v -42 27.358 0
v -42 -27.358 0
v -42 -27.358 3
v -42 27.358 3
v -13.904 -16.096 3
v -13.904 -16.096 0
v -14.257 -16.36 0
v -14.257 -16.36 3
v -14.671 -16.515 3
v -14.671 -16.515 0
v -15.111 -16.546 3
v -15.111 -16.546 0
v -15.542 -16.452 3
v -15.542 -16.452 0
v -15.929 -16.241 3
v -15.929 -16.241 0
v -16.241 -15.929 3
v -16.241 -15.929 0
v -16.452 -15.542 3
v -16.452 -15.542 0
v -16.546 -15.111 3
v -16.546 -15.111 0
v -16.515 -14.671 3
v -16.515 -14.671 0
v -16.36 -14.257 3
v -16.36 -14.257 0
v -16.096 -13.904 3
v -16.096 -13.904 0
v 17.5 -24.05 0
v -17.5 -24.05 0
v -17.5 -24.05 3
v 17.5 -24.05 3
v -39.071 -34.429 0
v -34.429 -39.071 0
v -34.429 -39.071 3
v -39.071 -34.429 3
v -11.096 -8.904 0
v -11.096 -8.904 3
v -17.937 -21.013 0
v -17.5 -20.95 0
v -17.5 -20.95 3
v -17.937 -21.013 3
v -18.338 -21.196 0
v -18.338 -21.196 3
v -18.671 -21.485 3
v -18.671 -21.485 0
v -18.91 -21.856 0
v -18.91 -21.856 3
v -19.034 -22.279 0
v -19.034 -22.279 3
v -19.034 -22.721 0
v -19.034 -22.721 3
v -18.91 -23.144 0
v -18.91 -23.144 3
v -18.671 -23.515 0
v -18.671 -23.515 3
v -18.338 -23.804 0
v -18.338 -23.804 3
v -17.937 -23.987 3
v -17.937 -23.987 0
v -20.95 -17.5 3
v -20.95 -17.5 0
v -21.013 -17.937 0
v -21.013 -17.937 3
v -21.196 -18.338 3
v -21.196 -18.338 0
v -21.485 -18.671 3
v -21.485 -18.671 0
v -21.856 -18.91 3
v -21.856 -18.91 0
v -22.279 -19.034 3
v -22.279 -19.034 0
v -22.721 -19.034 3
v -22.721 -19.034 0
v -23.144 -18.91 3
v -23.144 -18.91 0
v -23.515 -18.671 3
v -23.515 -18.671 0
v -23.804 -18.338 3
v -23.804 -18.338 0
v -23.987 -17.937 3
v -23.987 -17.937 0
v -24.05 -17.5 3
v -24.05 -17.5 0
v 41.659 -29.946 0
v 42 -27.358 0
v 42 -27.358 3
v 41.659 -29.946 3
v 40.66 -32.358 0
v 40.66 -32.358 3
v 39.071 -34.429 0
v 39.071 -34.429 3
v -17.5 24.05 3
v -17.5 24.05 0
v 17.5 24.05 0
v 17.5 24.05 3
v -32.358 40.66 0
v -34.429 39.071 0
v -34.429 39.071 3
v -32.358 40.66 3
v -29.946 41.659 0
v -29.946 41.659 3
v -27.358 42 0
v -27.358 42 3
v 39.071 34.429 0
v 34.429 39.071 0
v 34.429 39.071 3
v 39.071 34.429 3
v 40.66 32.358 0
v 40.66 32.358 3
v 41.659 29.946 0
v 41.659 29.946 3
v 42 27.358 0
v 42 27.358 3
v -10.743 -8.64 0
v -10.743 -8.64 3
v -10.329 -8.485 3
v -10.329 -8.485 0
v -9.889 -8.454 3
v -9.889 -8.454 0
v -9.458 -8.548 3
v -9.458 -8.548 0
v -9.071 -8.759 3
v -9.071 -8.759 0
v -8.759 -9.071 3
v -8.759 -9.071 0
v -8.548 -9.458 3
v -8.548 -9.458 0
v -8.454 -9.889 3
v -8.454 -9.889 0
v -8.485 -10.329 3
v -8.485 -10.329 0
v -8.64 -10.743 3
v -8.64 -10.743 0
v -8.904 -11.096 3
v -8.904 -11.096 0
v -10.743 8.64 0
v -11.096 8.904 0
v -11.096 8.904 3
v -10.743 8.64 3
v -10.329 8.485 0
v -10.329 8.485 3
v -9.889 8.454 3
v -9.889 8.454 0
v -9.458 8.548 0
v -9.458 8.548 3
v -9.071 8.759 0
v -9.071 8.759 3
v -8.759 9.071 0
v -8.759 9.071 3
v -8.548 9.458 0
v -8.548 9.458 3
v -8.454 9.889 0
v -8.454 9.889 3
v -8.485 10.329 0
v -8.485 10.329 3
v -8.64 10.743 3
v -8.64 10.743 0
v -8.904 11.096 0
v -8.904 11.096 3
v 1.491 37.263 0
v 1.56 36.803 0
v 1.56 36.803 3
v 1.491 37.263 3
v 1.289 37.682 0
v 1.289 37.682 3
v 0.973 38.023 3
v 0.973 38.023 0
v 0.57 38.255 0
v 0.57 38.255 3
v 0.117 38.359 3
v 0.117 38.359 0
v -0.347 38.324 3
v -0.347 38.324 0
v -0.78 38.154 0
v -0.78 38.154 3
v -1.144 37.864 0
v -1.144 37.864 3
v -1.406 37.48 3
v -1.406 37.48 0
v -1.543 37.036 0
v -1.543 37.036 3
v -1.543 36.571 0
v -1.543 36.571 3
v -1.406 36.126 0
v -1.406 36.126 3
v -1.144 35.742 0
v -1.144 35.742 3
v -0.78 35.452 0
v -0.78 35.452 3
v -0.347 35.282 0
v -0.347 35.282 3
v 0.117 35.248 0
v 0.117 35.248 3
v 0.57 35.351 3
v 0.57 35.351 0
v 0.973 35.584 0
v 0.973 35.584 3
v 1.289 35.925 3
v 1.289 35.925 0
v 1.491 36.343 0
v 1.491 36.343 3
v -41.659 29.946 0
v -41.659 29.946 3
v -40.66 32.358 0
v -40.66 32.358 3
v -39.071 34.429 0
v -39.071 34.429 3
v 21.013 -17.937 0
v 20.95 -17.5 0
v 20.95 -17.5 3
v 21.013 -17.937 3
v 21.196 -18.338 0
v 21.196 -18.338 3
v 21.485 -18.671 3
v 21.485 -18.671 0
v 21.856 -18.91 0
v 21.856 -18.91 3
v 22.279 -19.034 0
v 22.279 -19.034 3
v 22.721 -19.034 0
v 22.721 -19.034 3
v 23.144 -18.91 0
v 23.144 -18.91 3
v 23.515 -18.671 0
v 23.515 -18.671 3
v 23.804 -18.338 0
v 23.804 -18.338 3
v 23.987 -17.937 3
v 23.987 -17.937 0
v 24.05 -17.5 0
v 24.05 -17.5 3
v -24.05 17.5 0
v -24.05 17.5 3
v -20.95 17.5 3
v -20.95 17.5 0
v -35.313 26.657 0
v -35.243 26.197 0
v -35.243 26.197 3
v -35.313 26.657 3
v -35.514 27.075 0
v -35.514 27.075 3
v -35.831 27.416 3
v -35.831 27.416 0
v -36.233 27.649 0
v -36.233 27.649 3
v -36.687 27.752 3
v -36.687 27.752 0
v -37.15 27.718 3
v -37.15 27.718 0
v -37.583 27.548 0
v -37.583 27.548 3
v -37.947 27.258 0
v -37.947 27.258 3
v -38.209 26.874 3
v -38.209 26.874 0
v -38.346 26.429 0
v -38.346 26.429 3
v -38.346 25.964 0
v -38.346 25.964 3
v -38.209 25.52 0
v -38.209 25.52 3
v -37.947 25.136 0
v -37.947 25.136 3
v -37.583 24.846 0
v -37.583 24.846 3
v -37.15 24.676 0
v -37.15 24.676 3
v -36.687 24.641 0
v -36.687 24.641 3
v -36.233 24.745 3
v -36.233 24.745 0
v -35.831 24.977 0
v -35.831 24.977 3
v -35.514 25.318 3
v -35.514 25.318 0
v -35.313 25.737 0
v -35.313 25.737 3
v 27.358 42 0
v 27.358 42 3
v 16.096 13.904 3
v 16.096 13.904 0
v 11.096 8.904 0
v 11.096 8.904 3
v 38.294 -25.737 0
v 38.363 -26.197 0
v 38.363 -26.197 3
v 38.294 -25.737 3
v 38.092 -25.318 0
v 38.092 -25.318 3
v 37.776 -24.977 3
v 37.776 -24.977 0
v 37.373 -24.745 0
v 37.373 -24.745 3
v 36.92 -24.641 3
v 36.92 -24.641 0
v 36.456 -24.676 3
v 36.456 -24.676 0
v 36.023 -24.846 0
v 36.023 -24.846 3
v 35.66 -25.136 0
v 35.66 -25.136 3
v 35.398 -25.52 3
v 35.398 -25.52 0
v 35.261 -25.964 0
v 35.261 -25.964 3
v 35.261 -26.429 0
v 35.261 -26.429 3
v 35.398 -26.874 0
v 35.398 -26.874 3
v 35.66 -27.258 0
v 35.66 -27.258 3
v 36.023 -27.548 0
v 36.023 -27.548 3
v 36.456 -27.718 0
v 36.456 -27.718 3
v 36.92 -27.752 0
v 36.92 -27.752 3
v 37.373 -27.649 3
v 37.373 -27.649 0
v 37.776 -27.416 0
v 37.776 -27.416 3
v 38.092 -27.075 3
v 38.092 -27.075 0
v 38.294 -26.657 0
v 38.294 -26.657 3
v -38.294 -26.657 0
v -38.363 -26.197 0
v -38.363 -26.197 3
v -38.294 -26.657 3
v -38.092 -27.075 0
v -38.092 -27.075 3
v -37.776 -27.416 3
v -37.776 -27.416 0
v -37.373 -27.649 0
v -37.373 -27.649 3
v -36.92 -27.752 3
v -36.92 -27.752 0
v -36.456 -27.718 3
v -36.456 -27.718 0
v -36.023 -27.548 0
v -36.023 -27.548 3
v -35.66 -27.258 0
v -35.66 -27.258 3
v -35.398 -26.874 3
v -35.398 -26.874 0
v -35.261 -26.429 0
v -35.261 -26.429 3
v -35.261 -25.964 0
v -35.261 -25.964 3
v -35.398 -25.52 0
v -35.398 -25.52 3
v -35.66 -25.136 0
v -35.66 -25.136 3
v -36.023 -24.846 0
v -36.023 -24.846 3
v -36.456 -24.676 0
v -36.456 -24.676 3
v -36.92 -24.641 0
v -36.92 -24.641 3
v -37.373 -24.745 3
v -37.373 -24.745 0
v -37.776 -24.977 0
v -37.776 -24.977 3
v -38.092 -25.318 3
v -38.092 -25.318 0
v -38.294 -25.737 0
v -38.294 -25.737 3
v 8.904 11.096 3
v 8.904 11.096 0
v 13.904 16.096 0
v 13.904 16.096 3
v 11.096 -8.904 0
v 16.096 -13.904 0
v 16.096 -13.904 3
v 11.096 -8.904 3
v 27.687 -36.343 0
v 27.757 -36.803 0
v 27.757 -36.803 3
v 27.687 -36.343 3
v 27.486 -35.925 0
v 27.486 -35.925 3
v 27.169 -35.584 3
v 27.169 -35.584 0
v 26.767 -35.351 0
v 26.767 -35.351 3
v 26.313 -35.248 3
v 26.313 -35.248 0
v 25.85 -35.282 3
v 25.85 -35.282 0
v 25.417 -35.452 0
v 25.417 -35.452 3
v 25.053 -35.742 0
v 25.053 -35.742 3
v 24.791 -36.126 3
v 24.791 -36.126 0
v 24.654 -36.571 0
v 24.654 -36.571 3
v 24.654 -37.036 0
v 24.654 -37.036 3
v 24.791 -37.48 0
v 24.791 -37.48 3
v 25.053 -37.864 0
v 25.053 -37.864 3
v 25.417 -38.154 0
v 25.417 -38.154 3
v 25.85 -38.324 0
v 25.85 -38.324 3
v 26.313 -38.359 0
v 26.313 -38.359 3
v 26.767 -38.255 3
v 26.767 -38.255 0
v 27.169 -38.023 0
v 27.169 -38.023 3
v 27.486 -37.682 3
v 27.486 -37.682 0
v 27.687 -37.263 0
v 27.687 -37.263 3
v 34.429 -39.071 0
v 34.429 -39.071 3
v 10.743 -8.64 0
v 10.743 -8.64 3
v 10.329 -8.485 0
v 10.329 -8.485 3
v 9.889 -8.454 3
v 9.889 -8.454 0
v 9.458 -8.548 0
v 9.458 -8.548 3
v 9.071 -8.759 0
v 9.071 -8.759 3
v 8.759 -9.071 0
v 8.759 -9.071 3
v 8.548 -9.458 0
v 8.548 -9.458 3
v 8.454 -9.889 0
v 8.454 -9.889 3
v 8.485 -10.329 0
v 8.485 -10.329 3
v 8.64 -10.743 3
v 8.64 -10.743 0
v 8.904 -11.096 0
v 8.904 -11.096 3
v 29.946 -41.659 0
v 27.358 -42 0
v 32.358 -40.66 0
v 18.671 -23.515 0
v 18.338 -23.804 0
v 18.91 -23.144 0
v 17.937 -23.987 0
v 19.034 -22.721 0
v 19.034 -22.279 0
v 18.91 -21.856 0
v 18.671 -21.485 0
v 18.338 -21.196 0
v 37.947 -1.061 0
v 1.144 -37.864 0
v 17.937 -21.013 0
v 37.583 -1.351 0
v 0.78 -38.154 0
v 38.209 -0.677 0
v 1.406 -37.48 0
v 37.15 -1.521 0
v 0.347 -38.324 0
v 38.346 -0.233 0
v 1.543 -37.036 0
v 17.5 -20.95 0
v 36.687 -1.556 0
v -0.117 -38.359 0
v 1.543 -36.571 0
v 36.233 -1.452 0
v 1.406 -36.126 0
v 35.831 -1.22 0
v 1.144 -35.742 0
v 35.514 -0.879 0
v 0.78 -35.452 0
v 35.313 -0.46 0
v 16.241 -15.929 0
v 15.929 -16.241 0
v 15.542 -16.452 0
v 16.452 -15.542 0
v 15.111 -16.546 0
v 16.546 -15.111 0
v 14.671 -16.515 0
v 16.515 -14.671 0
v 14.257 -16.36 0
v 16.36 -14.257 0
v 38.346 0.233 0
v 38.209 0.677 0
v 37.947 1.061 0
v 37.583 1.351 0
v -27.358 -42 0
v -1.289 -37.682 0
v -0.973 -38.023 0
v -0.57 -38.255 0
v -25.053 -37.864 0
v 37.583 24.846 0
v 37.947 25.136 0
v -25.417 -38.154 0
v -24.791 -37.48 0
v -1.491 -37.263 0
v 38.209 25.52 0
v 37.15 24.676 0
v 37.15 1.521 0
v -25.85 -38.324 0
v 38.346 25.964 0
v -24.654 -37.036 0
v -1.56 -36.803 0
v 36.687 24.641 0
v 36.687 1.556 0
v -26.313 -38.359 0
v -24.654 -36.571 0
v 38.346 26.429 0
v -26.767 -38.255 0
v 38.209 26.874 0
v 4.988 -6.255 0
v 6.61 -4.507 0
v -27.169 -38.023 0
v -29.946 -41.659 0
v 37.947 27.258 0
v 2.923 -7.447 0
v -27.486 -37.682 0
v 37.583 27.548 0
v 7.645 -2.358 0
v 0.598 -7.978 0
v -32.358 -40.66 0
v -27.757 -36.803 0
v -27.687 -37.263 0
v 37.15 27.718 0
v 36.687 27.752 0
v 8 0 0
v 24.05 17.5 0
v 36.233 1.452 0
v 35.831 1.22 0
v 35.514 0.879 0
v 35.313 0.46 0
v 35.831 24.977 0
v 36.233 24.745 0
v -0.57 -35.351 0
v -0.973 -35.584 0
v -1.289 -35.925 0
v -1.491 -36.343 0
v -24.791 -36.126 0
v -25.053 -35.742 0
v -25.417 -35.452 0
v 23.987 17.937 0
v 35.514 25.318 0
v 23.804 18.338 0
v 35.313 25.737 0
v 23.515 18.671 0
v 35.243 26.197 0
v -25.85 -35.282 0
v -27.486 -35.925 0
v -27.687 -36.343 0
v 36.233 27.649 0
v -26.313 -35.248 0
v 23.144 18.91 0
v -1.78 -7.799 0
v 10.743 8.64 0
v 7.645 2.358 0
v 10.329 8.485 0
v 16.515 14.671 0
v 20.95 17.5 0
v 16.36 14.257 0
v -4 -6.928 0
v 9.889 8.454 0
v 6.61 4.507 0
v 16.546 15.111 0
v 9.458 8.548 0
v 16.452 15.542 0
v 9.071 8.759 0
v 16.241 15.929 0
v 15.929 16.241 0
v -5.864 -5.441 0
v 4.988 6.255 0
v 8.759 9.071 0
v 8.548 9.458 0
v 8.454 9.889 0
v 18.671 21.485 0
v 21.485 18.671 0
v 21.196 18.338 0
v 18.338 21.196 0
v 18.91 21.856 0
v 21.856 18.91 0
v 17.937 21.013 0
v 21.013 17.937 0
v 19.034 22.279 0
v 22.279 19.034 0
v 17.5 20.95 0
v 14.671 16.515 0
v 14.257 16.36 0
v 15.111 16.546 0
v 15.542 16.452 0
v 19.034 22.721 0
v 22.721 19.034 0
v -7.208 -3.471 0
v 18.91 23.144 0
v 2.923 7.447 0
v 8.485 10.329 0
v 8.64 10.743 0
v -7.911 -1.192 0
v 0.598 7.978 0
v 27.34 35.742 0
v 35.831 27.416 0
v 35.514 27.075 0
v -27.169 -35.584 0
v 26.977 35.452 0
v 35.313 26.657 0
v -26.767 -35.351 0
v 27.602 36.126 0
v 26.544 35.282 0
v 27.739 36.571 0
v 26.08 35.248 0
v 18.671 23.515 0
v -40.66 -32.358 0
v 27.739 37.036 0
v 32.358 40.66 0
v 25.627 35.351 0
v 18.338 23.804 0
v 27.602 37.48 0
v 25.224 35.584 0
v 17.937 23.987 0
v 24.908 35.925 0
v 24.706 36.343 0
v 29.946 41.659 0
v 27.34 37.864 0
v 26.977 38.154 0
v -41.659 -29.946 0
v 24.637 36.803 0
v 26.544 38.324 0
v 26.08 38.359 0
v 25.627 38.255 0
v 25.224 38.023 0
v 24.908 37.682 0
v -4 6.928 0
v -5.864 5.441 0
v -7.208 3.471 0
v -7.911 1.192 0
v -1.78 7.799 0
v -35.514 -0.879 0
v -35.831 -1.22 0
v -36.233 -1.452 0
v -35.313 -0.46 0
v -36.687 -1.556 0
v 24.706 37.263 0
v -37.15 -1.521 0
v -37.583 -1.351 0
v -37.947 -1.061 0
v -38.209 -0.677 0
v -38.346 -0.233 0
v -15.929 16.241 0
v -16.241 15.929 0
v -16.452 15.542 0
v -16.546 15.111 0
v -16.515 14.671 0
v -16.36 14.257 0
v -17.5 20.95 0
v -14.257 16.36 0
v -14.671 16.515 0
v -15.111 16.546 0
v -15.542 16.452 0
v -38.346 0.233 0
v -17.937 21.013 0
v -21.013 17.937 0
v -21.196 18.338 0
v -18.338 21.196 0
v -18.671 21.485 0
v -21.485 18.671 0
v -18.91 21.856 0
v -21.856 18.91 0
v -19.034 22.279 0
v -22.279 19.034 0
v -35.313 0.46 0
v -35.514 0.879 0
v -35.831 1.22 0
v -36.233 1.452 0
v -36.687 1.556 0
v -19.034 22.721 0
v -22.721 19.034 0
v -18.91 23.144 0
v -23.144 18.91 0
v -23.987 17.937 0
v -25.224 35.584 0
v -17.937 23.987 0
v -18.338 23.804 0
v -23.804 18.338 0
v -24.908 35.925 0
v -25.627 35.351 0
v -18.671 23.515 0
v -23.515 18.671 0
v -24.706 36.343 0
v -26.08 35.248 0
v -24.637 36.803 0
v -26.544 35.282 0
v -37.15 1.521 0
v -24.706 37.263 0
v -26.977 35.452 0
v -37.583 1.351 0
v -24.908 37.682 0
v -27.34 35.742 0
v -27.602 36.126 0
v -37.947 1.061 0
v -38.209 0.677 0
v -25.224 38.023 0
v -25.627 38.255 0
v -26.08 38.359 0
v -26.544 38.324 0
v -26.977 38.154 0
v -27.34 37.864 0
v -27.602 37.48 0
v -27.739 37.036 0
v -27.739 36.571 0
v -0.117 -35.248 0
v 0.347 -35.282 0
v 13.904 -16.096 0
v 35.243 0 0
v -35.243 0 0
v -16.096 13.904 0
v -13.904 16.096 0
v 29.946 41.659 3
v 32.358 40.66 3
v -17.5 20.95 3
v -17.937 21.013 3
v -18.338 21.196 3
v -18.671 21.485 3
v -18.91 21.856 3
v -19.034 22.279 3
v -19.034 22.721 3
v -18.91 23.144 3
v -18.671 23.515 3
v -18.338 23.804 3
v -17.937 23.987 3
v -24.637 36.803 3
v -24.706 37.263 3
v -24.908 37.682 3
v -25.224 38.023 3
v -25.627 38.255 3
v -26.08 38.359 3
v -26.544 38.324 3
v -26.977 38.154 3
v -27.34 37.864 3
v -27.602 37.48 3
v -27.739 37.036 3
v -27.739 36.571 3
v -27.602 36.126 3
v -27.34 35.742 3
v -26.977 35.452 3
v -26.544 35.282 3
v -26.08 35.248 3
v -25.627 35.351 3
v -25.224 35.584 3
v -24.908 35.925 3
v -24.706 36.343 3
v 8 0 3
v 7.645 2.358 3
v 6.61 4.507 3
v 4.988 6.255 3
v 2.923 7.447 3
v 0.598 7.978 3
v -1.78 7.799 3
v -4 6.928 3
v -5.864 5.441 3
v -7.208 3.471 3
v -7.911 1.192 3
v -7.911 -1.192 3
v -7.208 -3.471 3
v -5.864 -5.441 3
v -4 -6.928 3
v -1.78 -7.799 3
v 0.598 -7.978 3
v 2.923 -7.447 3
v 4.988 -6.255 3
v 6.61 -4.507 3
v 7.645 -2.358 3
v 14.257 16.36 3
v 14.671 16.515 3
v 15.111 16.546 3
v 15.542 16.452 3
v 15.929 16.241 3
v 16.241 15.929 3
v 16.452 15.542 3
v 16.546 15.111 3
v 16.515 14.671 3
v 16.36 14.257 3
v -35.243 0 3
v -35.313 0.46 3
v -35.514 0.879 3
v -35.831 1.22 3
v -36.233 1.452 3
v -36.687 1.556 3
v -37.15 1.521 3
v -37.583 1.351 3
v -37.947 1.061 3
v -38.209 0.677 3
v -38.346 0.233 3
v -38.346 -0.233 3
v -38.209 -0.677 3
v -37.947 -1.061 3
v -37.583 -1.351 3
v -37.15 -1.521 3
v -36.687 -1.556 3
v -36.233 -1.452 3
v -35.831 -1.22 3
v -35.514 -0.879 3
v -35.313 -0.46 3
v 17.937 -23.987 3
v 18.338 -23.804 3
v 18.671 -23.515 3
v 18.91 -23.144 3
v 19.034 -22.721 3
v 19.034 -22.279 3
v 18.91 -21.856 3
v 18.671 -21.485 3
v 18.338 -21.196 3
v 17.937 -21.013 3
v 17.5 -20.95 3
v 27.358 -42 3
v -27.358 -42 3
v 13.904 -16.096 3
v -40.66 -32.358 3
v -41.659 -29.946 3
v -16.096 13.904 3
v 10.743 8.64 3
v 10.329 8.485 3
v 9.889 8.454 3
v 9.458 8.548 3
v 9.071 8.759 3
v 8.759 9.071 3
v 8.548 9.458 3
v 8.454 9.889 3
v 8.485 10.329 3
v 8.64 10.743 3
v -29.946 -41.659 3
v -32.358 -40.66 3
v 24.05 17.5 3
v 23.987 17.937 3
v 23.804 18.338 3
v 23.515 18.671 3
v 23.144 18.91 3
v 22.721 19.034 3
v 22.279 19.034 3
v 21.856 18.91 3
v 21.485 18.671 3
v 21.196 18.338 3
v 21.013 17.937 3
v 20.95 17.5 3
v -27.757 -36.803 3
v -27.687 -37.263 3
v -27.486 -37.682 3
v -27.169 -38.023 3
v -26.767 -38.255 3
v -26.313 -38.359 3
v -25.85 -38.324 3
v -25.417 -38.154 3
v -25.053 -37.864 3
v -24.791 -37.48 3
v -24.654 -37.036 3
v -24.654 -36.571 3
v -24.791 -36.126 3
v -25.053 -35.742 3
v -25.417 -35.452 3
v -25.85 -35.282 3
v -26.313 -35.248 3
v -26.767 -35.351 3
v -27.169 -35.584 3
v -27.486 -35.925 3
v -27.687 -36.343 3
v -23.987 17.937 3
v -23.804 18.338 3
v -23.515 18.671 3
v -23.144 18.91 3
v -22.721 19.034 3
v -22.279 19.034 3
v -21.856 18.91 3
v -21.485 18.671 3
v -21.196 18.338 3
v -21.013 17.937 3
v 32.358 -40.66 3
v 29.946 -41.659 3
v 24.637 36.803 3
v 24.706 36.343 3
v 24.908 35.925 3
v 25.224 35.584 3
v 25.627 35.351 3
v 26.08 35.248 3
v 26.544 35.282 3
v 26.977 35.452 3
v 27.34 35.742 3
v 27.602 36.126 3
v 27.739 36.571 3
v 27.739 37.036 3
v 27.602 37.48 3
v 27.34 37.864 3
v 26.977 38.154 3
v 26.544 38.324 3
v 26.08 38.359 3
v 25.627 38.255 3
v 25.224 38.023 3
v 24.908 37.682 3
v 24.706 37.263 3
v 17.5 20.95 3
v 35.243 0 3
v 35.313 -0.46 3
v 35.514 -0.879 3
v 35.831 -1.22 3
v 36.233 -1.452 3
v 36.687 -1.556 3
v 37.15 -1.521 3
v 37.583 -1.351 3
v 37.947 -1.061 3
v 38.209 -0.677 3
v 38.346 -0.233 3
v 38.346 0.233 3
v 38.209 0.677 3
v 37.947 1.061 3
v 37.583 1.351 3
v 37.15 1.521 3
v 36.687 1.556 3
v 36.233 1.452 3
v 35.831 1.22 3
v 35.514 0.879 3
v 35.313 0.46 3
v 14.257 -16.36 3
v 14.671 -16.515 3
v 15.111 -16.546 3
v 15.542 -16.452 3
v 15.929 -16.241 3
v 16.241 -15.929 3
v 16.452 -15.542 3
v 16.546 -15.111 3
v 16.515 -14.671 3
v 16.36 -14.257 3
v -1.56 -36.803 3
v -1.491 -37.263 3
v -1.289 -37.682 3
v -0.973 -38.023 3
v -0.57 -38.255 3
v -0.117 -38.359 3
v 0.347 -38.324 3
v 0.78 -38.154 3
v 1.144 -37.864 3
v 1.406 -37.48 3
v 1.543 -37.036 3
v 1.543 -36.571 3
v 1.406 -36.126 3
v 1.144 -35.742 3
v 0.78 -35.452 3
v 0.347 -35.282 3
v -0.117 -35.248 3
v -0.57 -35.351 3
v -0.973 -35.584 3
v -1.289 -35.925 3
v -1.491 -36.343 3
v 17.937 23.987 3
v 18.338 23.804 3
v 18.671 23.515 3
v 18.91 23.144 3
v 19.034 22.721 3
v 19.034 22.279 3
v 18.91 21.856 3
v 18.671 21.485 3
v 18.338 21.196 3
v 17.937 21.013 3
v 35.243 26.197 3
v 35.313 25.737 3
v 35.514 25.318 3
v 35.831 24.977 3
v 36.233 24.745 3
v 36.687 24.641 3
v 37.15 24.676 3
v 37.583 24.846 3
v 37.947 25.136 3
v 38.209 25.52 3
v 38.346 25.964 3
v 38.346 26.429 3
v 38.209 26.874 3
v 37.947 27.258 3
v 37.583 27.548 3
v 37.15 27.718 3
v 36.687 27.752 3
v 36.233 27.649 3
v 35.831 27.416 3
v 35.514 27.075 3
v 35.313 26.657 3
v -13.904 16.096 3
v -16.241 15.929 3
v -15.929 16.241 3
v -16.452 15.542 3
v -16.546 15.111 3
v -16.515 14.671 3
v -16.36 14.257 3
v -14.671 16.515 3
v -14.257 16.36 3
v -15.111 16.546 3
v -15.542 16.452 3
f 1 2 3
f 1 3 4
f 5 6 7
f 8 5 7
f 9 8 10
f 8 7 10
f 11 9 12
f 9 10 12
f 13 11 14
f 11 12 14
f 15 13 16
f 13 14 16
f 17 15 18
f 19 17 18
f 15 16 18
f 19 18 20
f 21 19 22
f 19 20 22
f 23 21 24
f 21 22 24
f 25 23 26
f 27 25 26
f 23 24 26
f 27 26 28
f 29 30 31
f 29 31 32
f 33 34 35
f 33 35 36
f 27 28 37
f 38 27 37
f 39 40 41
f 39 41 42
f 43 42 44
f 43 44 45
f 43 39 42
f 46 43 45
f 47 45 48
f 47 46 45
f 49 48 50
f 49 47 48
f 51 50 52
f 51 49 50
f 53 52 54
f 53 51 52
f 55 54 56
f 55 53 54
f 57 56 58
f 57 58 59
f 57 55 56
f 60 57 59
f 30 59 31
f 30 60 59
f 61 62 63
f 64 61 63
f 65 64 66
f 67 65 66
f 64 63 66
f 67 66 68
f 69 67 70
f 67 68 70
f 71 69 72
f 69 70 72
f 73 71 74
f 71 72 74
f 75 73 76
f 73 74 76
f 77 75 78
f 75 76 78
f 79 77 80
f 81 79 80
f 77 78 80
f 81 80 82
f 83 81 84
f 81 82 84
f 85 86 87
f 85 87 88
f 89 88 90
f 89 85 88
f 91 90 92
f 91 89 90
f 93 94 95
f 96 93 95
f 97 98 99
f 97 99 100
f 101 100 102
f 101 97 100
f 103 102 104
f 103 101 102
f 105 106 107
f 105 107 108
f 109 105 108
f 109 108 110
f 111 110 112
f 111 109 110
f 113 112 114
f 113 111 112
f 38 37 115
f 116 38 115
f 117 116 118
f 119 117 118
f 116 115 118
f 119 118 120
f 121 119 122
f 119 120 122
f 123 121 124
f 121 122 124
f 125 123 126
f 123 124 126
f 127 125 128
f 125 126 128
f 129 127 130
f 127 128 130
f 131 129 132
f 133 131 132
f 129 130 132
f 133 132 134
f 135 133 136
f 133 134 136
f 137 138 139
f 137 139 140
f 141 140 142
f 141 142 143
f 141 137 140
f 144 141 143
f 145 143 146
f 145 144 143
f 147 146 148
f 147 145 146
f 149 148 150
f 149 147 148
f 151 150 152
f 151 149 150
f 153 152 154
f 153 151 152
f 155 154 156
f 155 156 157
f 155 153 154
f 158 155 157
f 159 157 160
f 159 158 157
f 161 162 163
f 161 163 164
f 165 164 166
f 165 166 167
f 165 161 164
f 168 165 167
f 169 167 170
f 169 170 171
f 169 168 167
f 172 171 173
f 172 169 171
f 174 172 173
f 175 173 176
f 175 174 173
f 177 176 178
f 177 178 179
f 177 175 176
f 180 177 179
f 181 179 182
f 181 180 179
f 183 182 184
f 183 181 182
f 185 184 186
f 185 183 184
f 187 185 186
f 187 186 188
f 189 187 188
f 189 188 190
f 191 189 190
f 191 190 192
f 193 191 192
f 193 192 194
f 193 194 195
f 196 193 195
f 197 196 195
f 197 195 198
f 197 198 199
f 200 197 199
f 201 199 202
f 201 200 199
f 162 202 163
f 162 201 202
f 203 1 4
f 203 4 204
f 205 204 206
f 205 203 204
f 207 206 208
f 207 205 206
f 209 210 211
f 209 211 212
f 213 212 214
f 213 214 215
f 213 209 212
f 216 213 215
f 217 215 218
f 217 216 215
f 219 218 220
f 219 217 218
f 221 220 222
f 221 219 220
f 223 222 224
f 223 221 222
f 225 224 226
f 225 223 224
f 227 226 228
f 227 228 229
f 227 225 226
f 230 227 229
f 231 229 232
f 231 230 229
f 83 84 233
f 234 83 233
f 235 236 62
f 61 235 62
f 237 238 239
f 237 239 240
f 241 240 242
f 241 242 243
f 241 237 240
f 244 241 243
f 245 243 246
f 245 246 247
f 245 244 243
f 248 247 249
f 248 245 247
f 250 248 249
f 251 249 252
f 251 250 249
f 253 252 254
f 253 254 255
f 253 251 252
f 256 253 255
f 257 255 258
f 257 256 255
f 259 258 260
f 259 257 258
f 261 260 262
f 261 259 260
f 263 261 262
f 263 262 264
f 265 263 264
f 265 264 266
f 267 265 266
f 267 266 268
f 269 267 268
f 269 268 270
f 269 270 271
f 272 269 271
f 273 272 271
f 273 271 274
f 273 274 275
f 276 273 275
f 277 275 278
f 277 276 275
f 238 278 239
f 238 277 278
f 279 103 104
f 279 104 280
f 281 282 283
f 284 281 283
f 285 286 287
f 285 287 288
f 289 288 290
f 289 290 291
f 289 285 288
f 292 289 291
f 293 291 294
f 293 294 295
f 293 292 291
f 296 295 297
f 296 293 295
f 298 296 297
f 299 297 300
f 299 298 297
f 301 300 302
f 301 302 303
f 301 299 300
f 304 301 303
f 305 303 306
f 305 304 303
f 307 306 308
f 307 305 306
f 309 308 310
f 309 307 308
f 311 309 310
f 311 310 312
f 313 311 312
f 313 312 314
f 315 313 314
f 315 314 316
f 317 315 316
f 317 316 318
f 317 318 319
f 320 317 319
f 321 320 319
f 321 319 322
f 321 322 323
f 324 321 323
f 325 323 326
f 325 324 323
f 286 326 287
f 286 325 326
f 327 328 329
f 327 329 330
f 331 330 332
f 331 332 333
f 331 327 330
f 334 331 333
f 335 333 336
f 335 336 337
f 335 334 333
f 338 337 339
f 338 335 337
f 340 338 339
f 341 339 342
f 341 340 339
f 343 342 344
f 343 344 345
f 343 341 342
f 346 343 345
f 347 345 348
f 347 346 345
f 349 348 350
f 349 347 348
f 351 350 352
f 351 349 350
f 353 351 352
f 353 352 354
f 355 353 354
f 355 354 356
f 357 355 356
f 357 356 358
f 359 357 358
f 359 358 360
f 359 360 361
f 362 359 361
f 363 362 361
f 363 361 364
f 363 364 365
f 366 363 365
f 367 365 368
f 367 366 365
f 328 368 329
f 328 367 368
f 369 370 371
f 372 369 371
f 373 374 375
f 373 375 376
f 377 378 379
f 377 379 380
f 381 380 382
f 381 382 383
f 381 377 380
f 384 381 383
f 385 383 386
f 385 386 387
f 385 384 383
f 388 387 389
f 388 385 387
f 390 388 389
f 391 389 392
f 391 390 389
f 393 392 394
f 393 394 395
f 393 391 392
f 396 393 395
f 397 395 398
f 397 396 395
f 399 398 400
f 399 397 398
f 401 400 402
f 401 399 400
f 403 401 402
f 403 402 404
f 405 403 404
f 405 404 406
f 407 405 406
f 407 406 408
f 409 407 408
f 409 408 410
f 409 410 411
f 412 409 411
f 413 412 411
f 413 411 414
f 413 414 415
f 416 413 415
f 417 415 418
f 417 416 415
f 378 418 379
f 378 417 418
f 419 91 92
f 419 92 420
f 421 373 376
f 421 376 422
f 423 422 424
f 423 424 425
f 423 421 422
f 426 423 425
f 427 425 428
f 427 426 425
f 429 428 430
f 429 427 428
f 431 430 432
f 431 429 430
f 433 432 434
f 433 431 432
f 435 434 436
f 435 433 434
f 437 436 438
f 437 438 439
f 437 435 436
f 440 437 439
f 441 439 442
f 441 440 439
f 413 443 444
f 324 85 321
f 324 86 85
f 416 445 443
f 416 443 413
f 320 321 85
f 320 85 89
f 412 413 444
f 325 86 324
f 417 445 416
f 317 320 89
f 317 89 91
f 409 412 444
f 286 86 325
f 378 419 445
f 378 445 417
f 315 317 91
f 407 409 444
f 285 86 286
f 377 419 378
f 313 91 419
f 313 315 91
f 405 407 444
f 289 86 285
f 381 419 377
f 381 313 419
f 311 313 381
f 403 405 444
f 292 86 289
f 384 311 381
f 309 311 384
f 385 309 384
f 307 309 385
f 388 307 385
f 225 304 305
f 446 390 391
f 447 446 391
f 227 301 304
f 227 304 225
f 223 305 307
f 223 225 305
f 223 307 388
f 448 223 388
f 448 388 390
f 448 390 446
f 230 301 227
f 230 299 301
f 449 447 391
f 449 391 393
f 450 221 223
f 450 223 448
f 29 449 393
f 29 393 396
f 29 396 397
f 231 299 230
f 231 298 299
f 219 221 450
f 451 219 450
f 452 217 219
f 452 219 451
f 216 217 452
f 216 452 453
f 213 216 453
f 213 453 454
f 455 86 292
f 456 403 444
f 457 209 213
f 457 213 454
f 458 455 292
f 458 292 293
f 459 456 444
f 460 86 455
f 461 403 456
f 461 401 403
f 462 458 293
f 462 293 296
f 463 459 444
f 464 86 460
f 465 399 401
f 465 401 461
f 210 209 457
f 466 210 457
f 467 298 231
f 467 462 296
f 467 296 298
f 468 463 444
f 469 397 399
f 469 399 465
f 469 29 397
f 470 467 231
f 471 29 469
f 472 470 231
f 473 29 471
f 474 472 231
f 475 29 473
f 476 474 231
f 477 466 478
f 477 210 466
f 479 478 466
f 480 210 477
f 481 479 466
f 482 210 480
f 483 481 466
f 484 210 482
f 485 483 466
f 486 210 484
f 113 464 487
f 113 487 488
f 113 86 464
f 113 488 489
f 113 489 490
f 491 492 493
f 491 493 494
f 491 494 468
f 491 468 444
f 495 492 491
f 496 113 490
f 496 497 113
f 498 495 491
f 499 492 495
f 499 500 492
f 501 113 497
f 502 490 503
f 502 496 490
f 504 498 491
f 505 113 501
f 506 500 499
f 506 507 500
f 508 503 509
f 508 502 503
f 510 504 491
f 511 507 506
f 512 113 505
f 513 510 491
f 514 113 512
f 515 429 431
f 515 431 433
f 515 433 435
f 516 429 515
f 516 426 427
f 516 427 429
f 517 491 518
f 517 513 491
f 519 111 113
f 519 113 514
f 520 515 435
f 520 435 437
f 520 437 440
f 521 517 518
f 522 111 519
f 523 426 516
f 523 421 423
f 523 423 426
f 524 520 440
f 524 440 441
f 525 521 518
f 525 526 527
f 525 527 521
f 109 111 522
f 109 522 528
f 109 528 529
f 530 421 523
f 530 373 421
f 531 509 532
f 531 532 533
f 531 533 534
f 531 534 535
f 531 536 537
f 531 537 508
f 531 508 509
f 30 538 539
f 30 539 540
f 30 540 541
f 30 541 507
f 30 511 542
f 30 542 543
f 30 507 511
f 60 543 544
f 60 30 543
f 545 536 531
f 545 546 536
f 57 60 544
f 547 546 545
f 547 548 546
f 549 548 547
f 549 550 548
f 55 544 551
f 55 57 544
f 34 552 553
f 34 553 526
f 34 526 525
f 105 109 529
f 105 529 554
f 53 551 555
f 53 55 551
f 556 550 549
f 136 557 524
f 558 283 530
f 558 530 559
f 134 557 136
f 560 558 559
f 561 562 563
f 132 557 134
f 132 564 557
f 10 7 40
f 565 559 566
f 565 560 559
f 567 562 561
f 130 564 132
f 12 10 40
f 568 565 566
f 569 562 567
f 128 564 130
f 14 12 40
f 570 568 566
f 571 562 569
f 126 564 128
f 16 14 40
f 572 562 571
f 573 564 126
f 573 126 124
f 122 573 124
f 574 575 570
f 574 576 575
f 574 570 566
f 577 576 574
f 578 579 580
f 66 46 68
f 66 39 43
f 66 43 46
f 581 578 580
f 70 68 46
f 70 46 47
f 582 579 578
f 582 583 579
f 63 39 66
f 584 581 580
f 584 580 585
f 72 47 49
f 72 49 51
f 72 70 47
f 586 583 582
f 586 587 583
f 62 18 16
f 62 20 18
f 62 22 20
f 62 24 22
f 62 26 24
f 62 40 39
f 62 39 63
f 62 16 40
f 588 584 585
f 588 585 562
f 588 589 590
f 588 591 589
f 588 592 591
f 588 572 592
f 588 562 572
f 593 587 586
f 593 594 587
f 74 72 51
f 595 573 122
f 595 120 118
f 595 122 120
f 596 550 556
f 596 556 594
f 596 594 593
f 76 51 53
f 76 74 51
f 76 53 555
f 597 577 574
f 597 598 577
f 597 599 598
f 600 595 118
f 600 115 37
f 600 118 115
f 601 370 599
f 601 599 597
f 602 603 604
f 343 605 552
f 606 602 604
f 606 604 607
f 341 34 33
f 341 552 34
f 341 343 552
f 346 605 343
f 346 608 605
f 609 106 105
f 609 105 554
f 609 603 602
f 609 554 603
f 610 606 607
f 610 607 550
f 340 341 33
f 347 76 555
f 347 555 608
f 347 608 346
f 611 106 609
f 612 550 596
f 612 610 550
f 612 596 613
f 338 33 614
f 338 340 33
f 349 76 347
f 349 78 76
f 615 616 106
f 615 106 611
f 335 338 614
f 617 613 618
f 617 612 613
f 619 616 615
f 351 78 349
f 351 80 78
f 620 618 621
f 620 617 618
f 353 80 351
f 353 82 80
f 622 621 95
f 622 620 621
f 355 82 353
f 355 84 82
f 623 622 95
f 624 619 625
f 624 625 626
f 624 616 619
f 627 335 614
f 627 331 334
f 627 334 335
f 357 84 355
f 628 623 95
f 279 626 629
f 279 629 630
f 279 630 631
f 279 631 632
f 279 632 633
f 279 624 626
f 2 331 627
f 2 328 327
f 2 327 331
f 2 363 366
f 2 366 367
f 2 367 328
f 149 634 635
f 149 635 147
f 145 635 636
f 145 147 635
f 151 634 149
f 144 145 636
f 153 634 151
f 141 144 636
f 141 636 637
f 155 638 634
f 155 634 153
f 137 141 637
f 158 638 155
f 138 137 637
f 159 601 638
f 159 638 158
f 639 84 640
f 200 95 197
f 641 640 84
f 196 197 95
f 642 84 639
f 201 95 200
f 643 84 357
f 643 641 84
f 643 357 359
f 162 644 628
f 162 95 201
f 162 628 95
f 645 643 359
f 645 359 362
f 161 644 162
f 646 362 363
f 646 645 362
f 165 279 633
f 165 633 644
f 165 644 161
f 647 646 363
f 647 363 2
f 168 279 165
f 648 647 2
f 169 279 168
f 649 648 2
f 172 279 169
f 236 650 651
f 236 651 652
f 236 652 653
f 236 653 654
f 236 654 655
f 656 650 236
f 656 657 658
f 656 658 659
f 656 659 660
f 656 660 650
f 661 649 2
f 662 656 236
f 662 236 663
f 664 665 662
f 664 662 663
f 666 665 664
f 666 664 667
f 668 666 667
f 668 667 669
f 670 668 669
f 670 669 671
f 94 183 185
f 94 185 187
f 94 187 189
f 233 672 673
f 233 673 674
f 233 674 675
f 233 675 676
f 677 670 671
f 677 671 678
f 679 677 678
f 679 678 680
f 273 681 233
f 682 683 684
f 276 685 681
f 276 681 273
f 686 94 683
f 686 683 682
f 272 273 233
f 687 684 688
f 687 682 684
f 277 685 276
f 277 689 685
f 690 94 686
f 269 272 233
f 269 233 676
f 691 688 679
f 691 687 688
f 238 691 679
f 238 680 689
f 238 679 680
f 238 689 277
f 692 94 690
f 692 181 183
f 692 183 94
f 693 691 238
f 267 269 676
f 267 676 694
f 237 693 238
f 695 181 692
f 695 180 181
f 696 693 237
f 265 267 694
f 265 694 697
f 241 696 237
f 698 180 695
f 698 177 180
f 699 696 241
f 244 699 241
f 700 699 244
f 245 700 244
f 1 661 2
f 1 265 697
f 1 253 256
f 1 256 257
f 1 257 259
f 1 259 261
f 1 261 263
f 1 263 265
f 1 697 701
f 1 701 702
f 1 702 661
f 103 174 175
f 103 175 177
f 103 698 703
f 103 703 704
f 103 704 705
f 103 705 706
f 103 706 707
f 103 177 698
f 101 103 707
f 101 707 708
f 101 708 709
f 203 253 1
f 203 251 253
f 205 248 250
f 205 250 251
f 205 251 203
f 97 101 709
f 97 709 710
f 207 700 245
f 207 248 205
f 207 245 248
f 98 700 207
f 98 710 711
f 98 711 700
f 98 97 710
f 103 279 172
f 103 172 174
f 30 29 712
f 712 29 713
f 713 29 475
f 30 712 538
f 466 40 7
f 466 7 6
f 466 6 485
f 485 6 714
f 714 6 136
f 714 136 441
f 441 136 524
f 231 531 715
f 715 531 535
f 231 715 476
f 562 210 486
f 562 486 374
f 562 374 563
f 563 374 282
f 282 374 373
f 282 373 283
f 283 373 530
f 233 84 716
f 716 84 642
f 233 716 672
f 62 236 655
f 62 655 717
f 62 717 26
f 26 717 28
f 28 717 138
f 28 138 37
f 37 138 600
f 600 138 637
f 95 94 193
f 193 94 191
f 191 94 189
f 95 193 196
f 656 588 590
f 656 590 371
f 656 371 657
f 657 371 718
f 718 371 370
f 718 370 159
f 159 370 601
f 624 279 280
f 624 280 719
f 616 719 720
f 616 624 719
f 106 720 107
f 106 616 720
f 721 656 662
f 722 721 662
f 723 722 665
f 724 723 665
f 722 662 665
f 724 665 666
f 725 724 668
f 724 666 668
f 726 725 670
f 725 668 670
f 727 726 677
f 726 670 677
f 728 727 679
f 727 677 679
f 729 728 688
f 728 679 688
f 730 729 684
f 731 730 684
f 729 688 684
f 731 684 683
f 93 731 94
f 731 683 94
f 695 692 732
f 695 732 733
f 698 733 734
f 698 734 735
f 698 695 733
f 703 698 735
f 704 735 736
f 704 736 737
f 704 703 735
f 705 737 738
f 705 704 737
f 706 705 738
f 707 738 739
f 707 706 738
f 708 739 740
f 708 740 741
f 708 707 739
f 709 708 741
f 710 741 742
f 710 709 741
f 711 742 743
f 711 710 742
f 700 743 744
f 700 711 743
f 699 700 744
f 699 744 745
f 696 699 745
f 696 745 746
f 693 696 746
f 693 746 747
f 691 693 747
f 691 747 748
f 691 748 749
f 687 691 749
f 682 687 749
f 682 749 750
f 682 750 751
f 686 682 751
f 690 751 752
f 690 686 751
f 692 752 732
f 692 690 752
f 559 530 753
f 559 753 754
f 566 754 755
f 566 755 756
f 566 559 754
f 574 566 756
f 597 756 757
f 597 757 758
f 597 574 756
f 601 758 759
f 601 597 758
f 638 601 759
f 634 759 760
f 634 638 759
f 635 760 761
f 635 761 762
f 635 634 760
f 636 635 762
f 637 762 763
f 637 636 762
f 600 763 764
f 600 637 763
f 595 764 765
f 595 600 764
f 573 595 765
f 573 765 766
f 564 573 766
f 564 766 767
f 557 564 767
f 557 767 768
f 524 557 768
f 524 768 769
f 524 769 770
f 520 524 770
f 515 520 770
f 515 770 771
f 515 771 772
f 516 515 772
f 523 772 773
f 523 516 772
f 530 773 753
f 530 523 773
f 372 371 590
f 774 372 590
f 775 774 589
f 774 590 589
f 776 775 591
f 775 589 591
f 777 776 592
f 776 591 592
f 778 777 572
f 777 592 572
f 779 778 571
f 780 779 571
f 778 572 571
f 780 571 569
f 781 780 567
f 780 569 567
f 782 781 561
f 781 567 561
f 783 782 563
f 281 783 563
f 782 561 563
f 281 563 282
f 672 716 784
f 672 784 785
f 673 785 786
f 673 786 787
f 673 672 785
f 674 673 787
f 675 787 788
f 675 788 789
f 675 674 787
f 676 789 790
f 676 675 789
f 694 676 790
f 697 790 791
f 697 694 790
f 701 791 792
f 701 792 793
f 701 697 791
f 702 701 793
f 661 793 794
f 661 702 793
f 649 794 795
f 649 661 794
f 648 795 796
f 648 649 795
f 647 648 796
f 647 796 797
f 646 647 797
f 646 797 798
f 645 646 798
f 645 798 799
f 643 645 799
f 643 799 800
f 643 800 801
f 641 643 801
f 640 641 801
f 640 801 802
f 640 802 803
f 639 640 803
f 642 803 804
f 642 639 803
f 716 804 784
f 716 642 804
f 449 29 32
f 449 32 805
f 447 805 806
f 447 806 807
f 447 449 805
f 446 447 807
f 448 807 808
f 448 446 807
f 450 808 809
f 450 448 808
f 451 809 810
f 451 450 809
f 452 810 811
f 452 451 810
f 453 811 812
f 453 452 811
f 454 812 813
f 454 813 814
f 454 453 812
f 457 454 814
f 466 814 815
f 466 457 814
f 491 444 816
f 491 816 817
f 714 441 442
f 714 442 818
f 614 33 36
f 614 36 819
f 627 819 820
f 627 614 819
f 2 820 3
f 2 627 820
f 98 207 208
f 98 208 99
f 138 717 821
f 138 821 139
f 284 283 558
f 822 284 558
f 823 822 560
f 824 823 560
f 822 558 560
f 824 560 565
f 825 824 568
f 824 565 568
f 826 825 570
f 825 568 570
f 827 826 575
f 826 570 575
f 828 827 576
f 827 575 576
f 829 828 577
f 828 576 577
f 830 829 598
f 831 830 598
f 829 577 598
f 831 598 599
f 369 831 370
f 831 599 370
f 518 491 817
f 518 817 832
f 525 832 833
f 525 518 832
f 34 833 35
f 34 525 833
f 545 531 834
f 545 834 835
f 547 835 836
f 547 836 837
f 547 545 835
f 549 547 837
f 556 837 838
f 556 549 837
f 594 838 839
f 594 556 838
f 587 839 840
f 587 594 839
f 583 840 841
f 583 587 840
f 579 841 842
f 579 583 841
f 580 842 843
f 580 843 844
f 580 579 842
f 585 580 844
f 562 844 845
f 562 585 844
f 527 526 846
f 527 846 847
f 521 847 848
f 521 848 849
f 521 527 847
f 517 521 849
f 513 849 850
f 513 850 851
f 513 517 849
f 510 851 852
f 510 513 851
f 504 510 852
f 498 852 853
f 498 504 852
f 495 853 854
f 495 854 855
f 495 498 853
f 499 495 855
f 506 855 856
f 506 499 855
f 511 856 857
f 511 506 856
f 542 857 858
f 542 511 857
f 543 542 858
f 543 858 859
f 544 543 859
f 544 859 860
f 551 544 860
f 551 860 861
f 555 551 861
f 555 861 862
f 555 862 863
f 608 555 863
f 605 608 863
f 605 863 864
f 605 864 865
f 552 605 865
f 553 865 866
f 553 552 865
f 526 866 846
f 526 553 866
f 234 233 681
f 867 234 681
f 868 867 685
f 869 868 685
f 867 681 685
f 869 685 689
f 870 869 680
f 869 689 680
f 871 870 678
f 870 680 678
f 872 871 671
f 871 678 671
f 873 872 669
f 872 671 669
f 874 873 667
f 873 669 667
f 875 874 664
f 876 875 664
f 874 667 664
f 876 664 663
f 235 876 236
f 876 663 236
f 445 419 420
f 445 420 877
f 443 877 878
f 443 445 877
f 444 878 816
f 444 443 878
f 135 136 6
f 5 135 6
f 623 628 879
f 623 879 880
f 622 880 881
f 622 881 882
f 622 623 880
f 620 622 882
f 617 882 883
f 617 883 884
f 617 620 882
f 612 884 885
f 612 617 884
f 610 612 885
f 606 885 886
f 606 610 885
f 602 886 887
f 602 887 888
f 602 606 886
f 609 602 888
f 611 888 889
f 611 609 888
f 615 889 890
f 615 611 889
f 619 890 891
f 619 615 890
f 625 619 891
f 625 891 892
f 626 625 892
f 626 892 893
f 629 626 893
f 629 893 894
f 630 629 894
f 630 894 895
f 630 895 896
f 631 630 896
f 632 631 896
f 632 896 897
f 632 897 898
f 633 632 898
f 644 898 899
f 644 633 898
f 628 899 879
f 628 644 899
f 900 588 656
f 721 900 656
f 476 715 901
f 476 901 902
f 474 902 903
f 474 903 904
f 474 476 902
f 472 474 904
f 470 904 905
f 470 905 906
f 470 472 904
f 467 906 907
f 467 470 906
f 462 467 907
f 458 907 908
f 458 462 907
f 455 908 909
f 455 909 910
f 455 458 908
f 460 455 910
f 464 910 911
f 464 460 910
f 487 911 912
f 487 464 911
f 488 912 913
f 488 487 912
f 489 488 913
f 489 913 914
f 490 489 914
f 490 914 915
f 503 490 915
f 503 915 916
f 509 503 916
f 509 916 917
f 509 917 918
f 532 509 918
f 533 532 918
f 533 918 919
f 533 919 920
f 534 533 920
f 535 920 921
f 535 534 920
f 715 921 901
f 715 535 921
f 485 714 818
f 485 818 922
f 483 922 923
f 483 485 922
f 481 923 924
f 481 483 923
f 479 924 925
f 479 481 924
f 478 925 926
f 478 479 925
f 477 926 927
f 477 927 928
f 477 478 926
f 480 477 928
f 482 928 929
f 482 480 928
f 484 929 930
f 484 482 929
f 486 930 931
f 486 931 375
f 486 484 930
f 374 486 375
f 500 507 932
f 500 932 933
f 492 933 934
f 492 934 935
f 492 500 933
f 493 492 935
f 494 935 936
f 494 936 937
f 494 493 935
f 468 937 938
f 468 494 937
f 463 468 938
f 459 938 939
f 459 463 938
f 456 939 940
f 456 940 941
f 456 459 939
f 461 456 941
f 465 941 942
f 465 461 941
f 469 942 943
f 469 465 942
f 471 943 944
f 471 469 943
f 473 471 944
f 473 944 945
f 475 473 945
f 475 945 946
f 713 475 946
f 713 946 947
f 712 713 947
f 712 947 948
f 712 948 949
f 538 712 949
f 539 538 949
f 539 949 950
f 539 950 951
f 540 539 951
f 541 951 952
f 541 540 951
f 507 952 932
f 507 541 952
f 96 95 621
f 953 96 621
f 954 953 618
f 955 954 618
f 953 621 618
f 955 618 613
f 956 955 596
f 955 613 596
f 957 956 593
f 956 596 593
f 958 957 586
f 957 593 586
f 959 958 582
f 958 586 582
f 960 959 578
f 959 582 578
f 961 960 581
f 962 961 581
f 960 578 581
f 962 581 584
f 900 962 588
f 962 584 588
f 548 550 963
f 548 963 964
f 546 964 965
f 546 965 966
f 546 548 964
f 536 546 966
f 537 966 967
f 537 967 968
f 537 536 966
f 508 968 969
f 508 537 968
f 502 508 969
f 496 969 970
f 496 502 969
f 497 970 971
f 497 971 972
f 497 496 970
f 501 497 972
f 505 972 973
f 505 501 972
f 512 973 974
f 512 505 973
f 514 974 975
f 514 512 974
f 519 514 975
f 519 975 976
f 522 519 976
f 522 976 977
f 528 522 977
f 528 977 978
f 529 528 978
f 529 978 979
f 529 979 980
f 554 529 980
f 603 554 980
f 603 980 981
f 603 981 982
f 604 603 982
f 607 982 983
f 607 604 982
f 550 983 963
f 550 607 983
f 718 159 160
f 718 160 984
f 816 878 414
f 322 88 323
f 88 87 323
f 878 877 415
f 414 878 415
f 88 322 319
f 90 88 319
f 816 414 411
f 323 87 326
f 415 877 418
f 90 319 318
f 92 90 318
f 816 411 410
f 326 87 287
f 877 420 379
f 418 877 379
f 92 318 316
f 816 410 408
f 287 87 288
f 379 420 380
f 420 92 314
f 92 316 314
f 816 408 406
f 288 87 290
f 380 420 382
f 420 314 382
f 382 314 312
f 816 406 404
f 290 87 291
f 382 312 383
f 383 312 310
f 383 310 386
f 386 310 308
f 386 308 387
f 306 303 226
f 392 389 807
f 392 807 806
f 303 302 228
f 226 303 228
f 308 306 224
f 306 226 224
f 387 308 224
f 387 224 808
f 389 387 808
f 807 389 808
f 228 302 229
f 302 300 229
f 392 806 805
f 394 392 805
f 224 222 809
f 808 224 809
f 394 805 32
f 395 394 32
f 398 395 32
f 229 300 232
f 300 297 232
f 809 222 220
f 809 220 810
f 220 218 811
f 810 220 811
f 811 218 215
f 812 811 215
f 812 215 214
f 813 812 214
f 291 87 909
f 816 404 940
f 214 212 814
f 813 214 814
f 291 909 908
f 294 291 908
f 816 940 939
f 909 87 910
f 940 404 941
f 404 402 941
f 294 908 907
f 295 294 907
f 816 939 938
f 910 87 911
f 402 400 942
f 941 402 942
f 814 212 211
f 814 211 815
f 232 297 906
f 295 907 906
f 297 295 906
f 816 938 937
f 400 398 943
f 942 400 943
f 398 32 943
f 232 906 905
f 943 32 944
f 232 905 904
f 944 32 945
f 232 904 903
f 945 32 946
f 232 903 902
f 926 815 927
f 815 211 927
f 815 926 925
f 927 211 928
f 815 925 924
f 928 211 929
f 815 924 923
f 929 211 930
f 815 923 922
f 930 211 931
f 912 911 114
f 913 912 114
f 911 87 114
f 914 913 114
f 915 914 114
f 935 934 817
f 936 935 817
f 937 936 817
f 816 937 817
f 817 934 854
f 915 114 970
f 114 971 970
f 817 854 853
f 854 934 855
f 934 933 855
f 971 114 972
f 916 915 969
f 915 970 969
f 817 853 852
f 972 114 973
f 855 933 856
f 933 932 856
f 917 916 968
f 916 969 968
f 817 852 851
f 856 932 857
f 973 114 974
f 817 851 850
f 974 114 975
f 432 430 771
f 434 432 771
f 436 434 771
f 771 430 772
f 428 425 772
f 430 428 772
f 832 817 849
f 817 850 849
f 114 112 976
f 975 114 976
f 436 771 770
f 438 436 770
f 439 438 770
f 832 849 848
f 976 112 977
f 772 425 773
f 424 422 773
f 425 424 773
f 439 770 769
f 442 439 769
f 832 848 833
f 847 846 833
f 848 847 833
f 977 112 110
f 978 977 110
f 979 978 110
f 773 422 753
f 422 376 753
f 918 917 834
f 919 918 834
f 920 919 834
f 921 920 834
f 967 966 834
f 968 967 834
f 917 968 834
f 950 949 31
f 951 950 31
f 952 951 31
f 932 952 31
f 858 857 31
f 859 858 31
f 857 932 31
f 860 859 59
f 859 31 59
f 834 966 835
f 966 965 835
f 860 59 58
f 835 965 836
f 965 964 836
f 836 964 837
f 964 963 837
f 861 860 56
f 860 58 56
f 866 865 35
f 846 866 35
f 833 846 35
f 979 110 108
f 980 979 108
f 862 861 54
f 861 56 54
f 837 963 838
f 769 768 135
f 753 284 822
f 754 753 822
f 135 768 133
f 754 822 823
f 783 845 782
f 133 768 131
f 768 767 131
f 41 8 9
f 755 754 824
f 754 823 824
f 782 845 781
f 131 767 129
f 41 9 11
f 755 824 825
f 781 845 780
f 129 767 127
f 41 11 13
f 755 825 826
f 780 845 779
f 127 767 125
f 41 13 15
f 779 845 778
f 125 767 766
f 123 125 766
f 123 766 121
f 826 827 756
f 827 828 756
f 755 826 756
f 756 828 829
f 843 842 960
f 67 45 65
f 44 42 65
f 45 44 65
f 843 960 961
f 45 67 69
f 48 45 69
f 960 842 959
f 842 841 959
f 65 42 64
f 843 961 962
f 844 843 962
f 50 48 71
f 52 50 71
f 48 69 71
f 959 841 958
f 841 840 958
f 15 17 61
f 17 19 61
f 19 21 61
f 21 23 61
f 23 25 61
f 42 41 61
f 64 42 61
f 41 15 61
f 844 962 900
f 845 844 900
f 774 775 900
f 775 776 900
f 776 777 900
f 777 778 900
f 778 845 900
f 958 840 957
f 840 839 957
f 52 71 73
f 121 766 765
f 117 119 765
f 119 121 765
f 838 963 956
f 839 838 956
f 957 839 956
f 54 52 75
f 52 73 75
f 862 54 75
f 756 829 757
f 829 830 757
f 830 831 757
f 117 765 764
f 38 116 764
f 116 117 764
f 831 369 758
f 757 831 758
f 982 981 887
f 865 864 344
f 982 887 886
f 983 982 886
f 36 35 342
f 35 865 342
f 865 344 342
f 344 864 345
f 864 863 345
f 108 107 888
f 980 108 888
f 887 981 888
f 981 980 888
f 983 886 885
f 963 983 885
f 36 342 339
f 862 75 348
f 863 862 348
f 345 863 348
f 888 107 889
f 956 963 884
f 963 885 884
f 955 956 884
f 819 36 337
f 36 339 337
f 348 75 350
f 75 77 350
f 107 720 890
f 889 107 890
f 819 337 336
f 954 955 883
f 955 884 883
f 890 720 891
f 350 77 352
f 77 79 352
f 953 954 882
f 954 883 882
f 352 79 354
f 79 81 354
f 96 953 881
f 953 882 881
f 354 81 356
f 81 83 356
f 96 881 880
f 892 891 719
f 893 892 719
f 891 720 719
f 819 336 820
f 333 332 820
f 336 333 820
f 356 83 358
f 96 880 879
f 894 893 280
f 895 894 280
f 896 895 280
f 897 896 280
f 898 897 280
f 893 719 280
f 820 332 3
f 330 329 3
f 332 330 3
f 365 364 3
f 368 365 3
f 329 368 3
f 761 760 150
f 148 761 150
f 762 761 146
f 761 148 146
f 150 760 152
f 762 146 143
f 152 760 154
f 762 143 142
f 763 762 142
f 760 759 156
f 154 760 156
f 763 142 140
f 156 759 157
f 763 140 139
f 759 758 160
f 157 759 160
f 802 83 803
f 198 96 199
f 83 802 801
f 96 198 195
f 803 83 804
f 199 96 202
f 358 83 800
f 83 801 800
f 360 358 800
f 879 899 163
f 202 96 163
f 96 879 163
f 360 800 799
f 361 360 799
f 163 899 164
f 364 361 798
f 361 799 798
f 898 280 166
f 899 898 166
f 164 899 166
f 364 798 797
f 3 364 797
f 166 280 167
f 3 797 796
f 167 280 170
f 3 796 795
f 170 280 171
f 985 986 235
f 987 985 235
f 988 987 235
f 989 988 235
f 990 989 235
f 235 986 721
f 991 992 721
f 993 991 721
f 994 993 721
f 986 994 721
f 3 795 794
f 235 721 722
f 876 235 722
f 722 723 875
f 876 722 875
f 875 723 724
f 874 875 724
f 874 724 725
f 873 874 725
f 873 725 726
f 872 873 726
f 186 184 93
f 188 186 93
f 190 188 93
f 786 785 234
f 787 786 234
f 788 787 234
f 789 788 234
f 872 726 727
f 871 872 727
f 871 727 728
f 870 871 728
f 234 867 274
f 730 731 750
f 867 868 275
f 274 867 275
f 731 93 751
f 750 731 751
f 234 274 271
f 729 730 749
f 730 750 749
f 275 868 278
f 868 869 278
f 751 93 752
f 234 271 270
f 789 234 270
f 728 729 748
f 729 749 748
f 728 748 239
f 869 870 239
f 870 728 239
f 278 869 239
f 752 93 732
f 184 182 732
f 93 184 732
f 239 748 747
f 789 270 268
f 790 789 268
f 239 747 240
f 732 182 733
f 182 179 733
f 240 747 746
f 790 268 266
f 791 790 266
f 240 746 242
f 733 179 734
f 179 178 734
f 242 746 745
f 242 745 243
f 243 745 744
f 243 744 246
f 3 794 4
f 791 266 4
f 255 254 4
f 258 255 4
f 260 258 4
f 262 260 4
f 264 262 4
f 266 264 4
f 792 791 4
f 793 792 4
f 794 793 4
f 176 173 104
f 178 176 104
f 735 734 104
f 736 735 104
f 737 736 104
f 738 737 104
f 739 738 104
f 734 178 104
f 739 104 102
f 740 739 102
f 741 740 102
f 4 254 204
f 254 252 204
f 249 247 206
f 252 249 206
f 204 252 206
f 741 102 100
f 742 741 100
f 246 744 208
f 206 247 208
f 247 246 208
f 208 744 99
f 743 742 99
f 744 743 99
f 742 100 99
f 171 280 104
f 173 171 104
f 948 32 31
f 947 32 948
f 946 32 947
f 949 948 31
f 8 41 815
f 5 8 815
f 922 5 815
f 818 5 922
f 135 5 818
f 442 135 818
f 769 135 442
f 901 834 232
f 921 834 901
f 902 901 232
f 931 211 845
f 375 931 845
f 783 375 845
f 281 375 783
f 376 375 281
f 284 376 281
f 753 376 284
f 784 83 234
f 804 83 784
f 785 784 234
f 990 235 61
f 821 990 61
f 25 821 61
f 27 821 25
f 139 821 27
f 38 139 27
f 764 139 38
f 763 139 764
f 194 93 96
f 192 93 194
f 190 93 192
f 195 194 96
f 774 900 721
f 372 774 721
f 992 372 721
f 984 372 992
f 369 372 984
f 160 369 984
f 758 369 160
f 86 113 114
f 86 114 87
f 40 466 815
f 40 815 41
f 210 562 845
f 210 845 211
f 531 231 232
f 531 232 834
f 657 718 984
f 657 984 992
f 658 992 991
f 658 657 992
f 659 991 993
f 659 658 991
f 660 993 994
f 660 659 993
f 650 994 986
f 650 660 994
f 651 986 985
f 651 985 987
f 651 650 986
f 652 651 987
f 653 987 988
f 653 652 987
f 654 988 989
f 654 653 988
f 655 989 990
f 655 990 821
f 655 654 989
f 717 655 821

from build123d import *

# Parameters (mm, degrees)
SKETCH_1_R      = 8
SKETCH_1_R_2    = 1.56
EXTRUDE_1_DEPTH = 3


with BuildPart() as part:
    # 草图1 → 凸台-拉伸1 (new body)
    with BuildSketch(Plane.XY):
        with BuildLine():
            Line((-27.357864376, 42), (27.357864376, 42))
            ThreePointArc((27.357864376, 42), (31.1846987, 41.238795325), (34.428932188, 39.071067812))
            Line((34.428932188, 39.071067812), (39.071067812, 34.428932188))
            ThreePointArc((39.071067812, 34.428932188), (41.238795325, 31.1846987), (42, 27.357864376))
            Line((42, 27.357864376), (42, -27.357864376))
            ThreePointArc((42, -27.357864376), (41.238795325, -31.1846987), (39.071067812, -34.428932188))
            Line((39.071067812, -34.428932188), (34.428932188, -39.071067812))
            ThreePointArc((34.428932188, -39.071067812), (31.1846987, -41.238795325), (27.357864376, -42))
            Line((27.357864376, -42), (-27.357864376, -42))
            ThreePointArc((-27.357864376, -42), (-31.1846987, -41.238795325), (-34.428932188, -39.071067812))
            Line((-34.428932188, -39.071067812), (-39.071067812, -34.428932188))
            ThreePointArc((-39.071067812, -34.428932188), (-41.238795325, -31.1846987), (-42, -27.357864376))
            Line((-42, -27.357864376), (-42, 27.357864376))
            ThreePointArc((-42, 27.357864376), (-41.238795325, 31.1846987), (-39.071067812, 34.428932188))
            Line((-39.071067812, 34.428932188), (-34.428932188, 39.071067812))
            ThreePointArc((-34.428932188, 39.071067812), (-31.1846987, 41.238795325), (-27.357864376, 42))
        make_face()
        Circle(SKETCH_1_R, mode=Mode.SUBTRACT)
        with Locations((-26.196699141, 36.803300859)):
            Circle(SKETCH_1_R_2, mode=Mode.SUBTRACT)
        with Locations((-36.803300859, 26.196699141)):
            Circle(SKETCH_1_R_2, mode=Mode.SUBTRACT)
        with Locations(Location((26.196699141, 36.803300859, 0), (0, 0, 180))):
            Circle(SKETCH_1_R_2, mode=Mode.SUBTRACT)
        with Locations(Location((36.803300859, 26.196699141, 0), (0, 0, 180))):
            Circle(SKETCH_1_R_2, mode=Mode.SUBTRACT)
        with Locations((36.803300859, -26.196699141)):
            Circle(SKETCH_1_R_2, mode=Mode.SUBTRACT)
        with Locations((26.196699141, -36.803300859)):
            Circle(SKETCH_1_R_2, mode=Mode.SUBTRACT)
        with Locations(Location((-26.196699141, -36.803300859, 0), (0, 0, 180))):
            Circle(SKETCH_1_R_2, mode=Mode.SUBTRACT)
        with Locations(Location((-36.803300859, -26.196699141, 0), (0, 0, 180))):
            Circle(SKETCH_1_R_2, mode=Mode.SUBTRACT)
        with Locations((0, 36.803300859)):
            Circle(SKETCH_1_R_2, mode=Mode.SUBTRACT)
        with Locations(Location((36.803300859, 0, 0), (0, 0, 180))):
            Circle(SKETCH_1_R_2, mode=Mode.SUBTRACT)
        with Locations(Location((0, -36.803300859, 0), (0, 0, 180))):
            Circle(SKETCH_1_R_2, mode=Mode.SUBTRACT)
        with Locations((-36.803300859, 0)):
            Circle(SKETCH_1_R_2, mode=Mode.SUBTRACT)
        with BuildLine():
            Line((-17.5, 24.05), (17.5, 24.05))
            ThreePointArc((17.5, 24.05), (19.05, 22.5), (17.5, 20.95))
            Line((17.5, 20.95), (-17.5, 20.95))
            ThreePointArc((-17.5, 20.95), (-19.05, 22.5), (-17.5, 24.05))
        make_face(mode=Mode.SUBTRACT)
        with BuildLine():
            Line((-17.5, -24.05), (17.5, -24.05))
            ThreePointArc((17.5, -24.05), (19.05, -22.5), (17.5, -20.95))
            Line((17.5, -20.95), (-17.5, -20.95))
            ThreePointArc((-17.5, -20.95), (-19.05, -22.5), (-17.5, -24.05))
        make_face(mode=Mode.SUBTRACT)
        with BuildLine():
            Line((24.05, -17.5), (24.05, 17.5))
            ThreePointArc((24.05, 17.5), (22.5, 19.05), (20.95, 17.5))
            Line((20.95, 17.5), (20.95, -17.5))
            ThreePointArc((20.95, -17.5), (22.5, -19.05), (24.05, -17.5))
        make_face(mode=Mode.SUBTRACT)
        with BuildLine():
            Line((-24.05, -17.5), (-24.05, 17.5))
            ThreePointArc((-24.05, 17.5), (-22.5, 19.05), (-20.95, 17.5))
            Line((-20.95, 17.5), (-20.95, -17.5))
            ThreePointArc((-20.95, -17.5), (-22.5, -19.05), (-24.05, -17.5))
        make_face(mode=Mode.SUBTRACT)
        with BuildLine():
            Line((8.903984489, 11.096015511), (13.903984489, 16.096015511))
            ThreePointArc((13.903984489, 16.096015511), (16.096015511, 16.096015511), (16.096015511, 13.903984489))
            Line((16.096015511, 13.903984489), (11.096015511, 8.903984489))
            ThreePointArc((11.096015511, 8.903984489), (8.903984489, 8.903984489), (8.903984489, 11.096015511))
        make_face(mode=Mode.SUBTRACT)
        with BuildLine():
            Line((-8.903984489, 11.096015511), (-13.903984489, 16.096015511))
            ThreePointArc((-13.903984489, 16.096015511), (-16.096015511, 16.096015511), (-16.096015511, 13.903984489))
            Line((-16.096015511, 13.903984489), (-11.096015511, 8.903984489))
            ThreePointArc((-11.096015511, 8.903984489), (-8.903984489, 8.903984489), (-8.903984489, 11.096015511))
        make_face(mode=Mode.SUBTRACT)
        with BuildLine():
            Line((-8.903984489, -11.096015511), (-13.903984489, -16.096015511))
            ThreePointArc((-13.903984489, -16.096015511), (-16.096015511, -16.096015511), (-16.096015511, -13.903984489))
            Line((-16.096015511, -13.903984489), (-11.096015511, -8.903984489))
            ThreePointArc((-11.096015511, -8.903984489), (-8.903984489, -8.903984489), (-8.903984489, -11.096015511))
        make_face(mode=Mode.SUBTRACT)
        with BuildLine():
            Line((8.903984489, -11.096015511), (13.903984489, -16.096015511))
            ThreePointArc((13.903984489, -16.096015511), (16.096015511, -16.096015511), (16.096015511, -13.903984489))
            Line((16.096015511, -13.903984489), (11.096015511, -8.903984489))
            ThreePointArc((11.096015511, -8.903984489), (8.903984489, -8.903984489), (8.903984489, -11.096015511))
        make_face(mode=Mode.SUBTRACT)
    extrude(amount=EXTRUDE_1_DEPTH)


solid = part.part
